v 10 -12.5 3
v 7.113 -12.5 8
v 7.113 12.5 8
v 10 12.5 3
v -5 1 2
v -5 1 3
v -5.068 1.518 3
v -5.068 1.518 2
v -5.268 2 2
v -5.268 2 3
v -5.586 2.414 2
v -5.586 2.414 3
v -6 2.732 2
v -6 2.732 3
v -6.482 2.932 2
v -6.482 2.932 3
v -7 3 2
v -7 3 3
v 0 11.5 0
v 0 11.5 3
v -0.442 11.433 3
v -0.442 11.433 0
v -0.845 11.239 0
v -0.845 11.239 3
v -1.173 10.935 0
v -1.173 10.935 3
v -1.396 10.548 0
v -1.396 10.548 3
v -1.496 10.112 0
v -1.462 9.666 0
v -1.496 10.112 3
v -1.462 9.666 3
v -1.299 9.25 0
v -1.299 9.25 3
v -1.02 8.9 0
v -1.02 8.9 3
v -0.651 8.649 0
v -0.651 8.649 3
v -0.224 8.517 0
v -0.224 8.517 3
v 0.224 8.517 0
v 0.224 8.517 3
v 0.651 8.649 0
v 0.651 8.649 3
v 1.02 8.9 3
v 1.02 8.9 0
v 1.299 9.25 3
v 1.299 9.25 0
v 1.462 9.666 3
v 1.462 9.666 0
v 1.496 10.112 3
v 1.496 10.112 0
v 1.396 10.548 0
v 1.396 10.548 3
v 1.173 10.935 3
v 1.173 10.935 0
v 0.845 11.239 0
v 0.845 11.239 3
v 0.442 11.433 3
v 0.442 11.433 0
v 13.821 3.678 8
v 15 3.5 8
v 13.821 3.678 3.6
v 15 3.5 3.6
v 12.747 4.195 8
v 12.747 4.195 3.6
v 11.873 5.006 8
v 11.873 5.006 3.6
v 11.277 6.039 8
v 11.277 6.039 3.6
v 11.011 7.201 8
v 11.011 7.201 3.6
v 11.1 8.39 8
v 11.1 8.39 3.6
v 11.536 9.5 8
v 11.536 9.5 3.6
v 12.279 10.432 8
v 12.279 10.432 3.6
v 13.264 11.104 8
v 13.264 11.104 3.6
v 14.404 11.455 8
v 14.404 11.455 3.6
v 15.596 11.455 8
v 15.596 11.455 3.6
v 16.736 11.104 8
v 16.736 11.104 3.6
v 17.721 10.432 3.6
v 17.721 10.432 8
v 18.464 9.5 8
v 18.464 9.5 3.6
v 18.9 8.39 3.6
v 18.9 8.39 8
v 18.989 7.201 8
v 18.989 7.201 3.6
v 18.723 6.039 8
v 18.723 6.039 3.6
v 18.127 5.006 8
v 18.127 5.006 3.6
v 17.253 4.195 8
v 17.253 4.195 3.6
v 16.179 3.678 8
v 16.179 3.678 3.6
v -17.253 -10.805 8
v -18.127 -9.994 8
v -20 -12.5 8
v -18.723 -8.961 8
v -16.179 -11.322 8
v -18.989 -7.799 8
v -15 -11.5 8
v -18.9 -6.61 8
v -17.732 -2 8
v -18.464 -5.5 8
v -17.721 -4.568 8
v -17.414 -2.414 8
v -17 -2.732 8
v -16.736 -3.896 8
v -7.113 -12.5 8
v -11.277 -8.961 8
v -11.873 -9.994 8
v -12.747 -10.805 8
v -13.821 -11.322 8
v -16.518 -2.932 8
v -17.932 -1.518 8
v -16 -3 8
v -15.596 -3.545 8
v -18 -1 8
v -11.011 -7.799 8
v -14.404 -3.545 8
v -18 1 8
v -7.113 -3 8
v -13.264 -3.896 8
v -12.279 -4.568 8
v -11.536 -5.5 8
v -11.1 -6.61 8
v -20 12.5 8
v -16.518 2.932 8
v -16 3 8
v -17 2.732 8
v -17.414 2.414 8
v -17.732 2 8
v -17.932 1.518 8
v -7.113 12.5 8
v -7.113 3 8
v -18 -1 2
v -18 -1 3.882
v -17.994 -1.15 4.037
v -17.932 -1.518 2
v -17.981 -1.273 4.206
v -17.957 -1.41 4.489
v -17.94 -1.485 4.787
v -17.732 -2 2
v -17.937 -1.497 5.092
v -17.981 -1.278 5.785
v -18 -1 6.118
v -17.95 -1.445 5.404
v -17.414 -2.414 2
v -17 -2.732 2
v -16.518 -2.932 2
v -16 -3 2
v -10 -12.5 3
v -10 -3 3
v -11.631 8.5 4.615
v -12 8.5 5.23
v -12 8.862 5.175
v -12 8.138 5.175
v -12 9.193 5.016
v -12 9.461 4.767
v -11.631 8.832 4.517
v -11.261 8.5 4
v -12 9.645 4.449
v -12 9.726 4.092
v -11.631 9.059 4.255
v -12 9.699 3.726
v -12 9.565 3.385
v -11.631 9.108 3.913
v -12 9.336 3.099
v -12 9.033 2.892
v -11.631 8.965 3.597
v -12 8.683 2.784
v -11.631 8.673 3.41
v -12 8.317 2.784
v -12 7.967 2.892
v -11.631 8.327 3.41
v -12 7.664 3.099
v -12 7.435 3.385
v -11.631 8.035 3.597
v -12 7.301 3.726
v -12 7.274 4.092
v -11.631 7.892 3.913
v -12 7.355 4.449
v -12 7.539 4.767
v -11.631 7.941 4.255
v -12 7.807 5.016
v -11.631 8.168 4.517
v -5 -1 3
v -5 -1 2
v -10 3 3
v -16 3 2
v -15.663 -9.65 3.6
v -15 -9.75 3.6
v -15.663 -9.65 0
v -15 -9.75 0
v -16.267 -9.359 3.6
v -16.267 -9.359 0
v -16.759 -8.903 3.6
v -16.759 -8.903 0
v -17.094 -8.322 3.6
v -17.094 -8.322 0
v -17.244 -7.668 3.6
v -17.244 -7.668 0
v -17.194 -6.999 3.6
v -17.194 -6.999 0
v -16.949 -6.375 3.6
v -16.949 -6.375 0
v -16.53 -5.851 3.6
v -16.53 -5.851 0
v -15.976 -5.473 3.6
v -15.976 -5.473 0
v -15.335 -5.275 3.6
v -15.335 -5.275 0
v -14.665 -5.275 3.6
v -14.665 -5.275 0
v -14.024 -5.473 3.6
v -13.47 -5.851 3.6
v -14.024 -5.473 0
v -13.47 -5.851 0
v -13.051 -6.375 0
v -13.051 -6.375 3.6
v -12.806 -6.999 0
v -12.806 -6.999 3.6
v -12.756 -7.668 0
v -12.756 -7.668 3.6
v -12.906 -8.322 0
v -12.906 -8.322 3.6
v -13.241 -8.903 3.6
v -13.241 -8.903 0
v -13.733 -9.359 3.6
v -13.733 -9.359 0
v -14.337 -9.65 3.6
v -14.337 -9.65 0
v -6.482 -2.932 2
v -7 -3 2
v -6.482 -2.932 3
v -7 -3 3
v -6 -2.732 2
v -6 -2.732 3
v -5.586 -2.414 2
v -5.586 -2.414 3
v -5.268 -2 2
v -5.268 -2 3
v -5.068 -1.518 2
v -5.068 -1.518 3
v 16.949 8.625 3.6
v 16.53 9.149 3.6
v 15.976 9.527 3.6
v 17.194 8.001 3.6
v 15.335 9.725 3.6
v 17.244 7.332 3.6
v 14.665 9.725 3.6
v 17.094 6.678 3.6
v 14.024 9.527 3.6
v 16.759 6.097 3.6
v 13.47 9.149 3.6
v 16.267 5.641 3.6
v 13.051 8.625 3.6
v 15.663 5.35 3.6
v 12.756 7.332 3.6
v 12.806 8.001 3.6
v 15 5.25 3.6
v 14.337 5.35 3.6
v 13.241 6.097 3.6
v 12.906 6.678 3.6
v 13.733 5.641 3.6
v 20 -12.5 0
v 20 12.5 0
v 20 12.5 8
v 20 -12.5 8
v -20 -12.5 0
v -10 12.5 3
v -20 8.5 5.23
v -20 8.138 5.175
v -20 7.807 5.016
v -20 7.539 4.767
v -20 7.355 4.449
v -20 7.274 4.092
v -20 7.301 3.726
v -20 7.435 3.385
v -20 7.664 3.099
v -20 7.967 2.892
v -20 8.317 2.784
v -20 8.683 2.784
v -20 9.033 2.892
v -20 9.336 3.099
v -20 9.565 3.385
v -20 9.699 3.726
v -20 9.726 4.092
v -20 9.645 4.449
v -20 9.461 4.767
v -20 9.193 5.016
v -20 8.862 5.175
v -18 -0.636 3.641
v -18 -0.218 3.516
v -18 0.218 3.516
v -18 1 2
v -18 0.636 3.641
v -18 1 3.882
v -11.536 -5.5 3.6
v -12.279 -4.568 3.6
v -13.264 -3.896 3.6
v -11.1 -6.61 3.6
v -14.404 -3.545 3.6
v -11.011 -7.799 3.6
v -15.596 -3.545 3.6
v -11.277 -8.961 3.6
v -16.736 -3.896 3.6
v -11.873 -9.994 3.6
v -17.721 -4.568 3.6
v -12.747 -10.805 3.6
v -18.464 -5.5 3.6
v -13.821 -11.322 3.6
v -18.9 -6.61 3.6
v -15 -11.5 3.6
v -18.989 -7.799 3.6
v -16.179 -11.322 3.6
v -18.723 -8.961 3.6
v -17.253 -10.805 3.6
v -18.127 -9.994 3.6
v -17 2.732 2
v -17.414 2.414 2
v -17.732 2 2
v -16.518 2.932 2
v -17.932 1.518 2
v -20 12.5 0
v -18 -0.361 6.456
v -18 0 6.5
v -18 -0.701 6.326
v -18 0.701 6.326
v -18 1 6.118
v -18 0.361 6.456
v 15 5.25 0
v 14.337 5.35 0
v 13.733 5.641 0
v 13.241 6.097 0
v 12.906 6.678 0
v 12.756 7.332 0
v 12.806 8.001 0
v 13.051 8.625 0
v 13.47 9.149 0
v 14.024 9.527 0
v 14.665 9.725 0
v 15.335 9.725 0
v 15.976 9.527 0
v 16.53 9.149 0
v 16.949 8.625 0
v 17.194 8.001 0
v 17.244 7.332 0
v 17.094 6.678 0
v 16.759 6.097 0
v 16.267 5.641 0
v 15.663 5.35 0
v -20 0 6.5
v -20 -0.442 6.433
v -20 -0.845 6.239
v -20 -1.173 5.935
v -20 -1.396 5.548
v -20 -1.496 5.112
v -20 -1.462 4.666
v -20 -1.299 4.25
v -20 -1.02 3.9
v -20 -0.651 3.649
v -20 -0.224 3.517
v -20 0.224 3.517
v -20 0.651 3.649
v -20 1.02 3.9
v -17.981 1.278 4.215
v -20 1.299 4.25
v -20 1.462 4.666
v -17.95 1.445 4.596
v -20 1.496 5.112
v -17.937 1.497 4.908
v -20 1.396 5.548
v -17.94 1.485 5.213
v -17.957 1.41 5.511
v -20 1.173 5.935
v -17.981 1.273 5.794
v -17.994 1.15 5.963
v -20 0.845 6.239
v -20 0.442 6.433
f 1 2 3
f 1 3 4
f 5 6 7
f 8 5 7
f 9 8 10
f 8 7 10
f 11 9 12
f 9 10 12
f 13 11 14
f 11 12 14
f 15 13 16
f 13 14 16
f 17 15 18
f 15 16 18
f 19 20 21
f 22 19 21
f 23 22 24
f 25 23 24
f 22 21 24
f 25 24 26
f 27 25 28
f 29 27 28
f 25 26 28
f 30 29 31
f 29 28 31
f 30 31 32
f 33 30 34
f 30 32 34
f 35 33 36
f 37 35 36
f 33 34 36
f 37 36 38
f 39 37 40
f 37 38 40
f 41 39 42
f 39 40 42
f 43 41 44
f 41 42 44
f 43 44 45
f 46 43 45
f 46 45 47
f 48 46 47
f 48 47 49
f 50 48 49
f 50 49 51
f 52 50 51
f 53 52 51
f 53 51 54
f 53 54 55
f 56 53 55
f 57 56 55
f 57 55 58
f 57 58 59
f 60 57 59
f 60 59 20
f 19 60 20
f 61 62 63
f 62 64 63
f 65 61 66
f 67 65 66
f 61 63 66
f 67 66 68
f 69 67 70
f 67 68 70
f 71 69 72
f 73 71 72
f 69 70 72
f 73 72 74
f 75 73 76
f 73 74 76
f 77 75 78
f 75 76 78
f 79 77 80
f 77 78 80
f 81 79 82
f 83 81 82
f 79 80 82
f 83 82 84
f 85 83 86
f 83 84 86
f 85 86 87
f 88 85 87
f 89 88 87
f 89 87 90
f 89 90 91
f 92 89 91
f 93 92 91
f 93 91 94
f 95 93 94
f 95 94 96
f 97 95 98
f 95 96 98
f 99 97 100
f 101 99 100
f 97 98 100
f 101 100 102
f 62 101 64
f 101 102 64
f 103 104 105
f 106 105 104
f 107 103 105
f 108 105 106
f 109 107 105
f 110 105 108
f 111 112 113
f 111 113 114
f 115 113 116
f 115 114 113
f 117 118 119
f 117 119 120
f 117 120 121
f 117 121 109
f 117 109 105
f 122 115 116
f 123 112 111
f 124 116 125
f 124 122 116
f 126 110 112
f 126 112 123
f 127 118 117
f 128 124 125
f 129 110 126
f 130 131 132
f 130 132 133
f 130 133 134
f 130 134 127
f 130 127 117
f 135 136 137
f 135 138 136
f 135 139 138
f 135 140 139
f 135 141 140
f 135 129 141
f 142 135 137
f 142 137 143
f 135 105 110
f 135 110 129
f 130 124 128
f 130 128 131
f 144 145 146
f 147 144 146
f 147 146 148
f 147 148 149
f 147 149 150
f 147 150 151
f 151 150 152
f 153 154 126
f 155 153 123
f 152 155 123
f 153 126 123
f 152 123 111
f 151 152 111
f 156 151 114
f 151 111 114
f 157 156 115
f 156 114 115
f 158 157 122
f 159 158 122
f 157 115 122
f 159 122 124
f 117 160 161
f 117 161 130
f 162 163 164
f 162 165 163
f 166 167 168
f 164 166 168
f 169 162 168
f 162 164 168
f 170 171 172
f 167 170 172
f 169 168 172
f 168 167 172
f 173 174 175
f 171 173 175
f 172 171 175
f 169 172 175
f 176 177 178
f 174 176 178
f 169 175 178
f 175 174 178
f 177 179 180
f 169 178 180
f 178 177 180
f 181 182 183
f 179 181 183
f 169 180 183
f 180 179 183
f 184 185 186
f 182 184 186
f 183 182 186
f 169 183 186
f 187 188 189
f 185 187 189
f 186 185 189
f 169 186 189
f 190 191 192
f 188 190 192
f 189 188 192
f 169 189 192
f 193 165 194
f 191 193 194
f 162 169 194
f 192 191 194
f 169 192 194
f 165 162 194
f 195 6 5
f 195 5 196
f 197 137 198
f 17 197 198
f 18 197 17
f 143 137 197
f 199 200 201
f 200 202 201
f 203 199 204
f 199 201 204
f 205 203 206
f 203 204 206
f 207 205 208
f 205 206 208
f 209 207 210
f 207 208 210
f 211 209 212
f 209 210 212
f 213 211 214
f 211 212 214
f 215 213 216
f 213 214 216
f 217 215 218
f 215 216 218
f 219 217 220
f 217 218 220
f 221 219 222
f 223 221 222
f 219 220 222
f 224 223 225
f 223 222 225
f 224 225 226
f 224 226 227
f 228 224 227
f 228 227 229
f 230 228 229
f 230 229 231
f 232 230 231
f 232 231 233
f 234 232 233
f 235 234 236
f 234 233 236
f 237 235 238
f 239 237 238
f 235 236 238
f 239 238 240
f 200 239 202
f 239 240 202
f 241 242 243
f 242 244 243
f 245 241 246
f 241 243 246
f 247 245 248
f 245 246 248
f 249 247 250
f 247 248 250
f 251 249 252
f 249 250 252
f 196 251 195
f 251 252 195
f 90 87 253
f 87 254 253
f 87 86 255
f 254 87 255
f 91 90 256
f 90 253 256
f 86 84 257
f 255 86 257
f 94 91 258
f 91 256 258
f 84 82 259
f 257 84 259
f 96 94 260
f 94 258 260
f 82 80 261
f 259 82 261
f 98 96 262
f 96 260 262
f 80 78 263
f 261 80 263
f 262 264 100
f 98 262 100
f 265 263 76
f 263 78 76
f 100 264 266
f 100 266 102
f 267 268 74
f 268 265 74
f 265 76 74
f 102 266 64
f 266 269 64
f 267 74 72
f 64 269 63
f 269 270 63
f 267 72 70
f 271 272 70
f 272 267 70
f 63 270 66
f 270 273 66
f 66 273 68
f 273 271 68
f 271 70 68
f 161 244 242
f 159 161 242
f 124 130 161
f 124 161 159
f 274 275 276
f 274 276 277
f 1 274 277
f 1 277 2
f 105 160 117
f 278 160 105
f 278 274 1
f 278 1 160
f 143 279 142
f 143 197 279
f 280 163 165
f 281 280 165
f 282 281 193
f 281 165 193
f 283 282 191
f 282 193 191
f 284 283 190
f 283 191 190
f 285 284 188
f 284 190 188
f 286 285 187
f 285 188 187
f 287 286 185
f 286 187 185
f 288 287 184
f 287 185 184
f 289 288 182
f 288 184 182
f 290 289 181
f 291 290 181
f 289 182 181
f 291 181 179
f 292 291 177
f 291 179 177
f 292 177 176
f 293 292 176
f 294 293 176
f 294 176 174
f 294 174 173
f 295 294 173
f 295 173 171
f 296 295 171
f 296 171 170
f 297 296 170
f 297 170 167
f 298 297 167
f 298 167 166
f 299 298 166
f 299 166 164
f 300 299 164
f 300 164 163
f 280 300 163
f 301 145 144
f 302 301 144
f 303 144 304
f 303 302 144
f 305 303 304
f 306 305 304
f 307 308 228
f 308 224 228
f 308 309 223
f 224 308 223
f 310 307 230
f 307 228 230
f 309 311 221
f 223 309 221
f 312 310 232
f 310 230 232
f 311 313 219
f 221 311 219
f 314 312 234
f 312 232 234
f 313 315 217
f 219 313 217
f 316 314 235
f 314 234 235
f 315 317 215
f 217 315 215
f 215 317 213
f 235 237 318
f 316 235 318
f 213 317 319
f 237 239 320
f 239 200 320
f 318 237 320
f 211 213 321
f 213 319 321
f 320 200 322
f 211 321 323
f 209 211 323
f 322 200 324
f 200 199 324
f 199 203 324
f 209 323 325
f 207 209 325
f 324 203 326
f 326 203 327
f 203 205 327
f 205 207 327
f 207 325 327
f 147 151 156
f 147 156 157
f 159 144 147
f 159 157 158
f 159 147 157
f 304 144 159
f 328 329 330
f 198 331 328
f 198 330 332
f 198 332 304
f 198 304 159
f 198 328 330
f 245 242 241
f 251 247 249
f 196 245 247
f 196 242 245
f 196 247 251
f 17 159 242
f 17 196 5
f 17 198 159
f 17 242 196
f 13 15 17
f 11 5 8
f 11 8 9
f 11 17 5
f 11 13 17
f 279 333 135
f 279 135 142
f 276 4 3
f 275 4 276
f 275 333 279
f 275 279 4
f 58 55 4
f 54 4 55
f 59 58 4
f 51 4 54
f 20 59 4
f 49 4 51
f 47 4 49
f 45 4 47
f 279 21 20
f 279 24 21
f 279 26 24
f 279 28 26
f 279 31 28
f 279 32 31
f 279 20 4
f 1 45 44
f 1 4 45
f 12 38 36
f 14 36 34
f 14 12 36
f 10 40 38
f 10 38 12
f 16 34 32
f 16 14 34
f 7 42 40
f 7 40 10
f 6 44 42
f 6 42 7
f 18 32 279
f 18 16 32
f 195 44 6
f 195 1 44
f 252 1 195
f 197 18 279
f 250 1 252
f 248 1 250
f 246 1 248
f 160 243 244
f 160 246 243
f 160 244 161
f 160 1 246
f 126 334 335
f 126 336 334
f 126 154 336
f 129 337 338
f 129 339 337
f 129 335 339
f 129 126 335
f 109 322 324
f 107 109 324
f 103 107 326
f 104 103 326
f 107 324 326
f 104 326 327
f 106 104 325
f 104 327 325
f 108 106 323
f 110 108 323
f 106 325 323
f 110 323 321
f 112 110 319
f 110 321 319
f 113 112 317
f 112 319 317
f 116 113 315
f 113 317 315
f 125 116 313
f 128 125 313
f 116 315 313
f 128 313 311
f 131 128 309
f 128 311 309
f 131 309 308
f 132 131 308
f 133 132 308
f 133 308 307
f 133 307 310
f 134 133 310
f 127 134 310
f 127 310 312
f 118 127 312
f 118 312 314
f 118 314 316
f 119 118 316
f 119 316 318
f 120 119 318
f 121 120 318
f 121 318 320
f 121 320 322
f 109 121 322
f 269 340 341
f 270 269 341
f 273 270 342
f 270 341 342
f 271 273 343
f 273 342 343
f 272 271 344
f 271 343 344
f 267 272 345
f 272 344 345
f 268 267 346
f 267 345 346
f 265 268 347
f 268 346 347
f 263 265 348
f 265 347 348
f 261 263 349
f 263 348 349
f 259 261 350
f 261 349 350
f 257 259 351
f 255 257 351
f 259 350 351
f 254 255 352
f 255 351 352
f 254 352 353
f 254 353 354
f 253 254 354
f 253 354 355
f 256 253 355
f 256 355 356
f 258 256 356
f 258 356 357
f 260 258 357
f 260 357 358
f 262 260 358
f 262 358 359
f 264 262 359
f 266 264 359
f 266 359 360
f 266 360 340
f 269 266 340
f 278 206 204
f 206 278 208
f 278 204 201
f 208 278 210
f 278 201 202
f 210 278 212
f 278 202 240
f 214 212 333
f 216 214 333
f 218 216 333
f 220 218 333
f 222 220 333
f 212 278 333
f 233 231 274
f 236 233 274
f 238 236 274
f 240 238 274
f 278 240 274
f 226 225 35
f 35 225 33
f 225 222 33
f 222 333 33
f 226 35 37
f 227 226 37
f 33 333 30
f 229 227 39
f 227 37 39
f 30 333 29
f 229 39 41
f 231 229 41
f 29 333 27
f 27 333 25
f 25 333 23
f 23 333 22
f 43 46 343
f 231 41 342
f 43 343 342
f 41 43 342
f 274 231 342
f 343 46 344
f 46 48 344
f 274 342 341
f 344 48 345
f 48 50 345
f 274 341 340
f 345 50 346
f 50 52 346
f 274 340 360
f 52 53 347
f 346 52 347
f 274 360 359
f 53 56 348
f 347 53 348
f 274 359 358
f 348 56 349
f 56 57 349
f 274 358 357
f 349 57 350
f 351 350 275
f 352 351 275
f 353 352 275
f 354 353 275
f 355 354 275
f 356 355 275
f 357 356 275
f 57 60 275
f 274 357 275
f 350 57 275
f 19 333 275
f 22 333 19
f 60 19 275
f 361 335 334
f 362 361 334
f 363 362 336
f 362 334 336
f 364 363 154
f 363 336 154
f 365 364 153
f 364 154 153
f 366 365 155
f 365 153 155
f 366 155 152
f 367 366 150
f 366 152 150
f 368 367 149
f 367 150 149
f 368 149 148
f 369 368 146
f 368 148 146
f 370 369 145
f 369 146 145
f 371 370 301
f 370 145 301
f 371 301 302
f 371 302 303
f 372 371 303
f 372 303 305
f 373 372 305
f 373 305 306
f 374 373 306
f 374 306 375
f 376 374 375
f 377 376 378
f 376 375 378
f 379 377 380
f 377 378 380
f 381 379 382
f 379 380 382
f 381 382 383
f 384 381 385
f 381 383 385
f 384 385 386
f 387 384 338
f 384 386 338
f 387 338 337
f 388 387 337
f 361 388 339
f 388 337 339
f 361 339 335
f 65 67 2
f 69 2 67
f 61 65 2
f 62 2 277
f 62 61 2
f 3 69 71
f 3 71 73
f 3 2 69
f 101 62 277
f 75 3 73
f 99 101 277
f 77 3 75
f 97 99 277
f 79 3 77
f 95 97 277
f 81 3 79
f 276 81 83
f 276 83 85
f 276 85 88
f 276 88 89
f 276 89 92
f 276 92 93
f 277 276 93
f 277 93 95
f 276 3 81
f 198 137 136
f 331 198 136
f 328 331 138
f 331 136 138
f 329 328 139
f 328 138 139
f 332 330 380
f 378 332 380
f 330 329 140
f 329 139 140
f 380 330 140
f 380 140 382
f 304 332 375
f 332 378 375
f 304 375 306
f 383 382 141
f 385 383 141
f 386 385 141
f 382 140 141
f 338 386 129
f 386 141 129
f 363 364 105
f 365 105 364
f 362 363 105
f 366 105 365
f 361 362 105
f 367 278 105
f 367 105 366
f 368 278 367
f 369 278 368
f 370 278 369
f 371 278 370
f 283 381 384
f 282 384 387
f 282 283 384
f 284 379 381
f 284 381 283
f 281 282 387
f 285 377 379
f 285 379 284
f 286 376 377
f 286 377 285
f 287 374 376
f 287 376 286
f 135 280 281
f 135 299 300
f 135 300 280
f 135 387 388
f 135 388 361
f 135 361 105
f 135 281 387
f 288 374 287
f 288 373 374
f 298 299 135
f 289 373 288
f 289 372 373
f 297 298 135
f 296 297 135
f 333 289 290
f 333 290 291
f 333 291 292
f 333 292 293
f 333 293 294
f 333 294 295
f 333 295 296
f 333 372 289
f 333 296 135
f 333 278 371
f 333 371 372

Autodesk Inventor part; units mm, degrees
ref_plane "YZ Plane" through (0, 0, 0) normal (1, 0, 0) x (0, 1, 0)
ref_plane "XZ Plane" through (0, 0, 0) normal (0, 1, 0) x (-1, 0, 0)
ref_plane "XY Plane" through (0, 0, 0) normal (0, 0, 1) x (1, 0, 0)
sketch "Skizze1" plane through (0, 0, 0) normal (0, 0, 1) x (1, 0, 0)
  line L0 (-20, 12.5) -> (20, 12.5)
  line L1 (20, 12.5) -> (20, -12.5)
  line L2 (20, -12.5) -> (-20, -12.5)
  line L3 (-20, -12.5) -> (-20, 12.5)
  line L4 (-28, 0) -> (28, 0) projected
  line L5 (0, -17.5) -> (0, 17.5) projected
  point P0 (0, 0)
  dimension "d0" = 40
  dimension "d1" = 25
extrude "Extrusion1" add sketch "Skizze1" along normal blind 8
sketch "Skizze2" plane through (0, 0, 8) normal (0, 0, 1) x (1, 0, 0)
  line L0 (-28, 0) -> (28, 0) projected
  line L1 (0, -17.5) -> (0, 17.5) projected
  line L2 (-15, 7.5) -> (15, 7.5)
  line L3 (15, 7.5) -> (15, -7.5)
  line L4 (15, -7.5) -> (-15, -7.5)
  line L5 (-15, -7.5) -> (-15, 7.5)
  point P0 (0, 0)
  dimension "d4" = 15
  dimension "d5" = 30
hole "Bohrung1" at (-15, -7.5, 8) at (15, 7.5, 8) direction (0, 0, -1) diameter 4.5 end through all counterbore diameter 8 counterbore depth 4.4
sketch "Skizze5" plane through (-20, -12.5, 0) normal (0, -1, 0) x (1, 0, 0)
  line L0 (40, 8) -> (0, 8) projected
  line L1 (-8, 0) -> (48, 0) projected
  line L2 (20, -1.6) -> (20, 9.6) projected
  line L3 (12.8868, 8) -> (27.1132, 8)
  line L4 (27.1132, 8) -> (30, 3)
  line L5 (30, 3) -> (10, 3)
  line L6 (10, 3) -> (12.8868, 8)
  point P0 (20, 0)
  dimension "d37" = 5
  dimension "d38" = 60
  dimension "d39" = 20
extrude "Extrusion2" cut sketch "Skizze5" against normal through all
sketch "Skizze6" plane through (0, 0, 0) normal (0, 0, -1) x (-1, 0, 0)
  line L0 (28, 0) -> (-28, 0) projected
  line L1 (0, -17.5) -> (0, 17.5) projected
  point P0 (0, 0)
  point P1 (0, 10)
  dimension "d42" = 10
hole "Bohrung5" at (0, 10, 0) direction (0, 0, 1) diameter 3 end through all
sketch "Skizze7" plane through (0, 0, 8) normal (0, 0, 1) x (1, 0, 0)
  line L0 (-20, -12.5) -> (-20, 12.5) projected
  line L1 (-28, 0) -> (28, 0) projected
  line L2 (0, -17.5) -> (0, 17.5) projected
  line L3 (-16, 3) -> (-7, 3)
  line L4 (-5, 1) -> (-5, -1)
  line L5 (-7, -3) -> (-16, -3)
  line L6 (-18, -1) -> (-18, 1)
  arc A0 (-16, 3) -> (-18, 1) centre (-16, 1) ccw
  arc A1 (-18, -1) -> (-16, -3) centre (-16, -1) ccw
  arc A2 (-7, -3) -> (-5, -1) centre (-7, -1) ccw
  arc A3 (-5, 1) -> (-7, 3) centre (-7, 1) ccw
  point P0 (0, 0)
  dimension "d53" = 2
  dimension "d54" = 15
  dimension "d55" = 13
  dimension "d56" = 2
  dimension "d57" = 6
extrude "Extrusion3" cut sketch "Skizze7" against normal blind 6
sketch "Skizze8" plane through (-20, -12.5, 0) normal (-1, 0, 0) x (0, 0, 1)
  line L0 (8, 0) -> (8, 25) projected
  line L1 (8, 15.5) -> (3, 15.5) projected
  line L2 (8, 15.5) -> (2, 15.5) projected
  line L3 (3, 15.5) -> (2, 15.5) projected
  line L4 (3.6, 1) -> (3.6, 9) projected
  line L5 (3, 9.5) -> (2, 9.5) projected
  line L6 (8, 9.5) -> (2, 9.5) projected
  line L7 (3, 9.5) -> (8, 9.5) projected
  line L8 (0, -5) -> (0, 30) projected
  line L9 (-1.6, 12.5) -> (9.6, 12.5) projected
  point P0 (0, 12.5)
  point P1 (5, 12.5)
  dimension "d60" = 3
hole "Bohrung6" at (-20, 0, 5) direction (1, 0, 0) diameter 3 depth 3 tip angle 118
hole "Bohrung7" at (-20, 8.5, 4) direction (1, 0, 0) diameter 2.459 depth 8 tip angle 118 thread size "M3x0.5" class "6H" standard "ISO Metric profile"
properties part number "13_1087_032"
